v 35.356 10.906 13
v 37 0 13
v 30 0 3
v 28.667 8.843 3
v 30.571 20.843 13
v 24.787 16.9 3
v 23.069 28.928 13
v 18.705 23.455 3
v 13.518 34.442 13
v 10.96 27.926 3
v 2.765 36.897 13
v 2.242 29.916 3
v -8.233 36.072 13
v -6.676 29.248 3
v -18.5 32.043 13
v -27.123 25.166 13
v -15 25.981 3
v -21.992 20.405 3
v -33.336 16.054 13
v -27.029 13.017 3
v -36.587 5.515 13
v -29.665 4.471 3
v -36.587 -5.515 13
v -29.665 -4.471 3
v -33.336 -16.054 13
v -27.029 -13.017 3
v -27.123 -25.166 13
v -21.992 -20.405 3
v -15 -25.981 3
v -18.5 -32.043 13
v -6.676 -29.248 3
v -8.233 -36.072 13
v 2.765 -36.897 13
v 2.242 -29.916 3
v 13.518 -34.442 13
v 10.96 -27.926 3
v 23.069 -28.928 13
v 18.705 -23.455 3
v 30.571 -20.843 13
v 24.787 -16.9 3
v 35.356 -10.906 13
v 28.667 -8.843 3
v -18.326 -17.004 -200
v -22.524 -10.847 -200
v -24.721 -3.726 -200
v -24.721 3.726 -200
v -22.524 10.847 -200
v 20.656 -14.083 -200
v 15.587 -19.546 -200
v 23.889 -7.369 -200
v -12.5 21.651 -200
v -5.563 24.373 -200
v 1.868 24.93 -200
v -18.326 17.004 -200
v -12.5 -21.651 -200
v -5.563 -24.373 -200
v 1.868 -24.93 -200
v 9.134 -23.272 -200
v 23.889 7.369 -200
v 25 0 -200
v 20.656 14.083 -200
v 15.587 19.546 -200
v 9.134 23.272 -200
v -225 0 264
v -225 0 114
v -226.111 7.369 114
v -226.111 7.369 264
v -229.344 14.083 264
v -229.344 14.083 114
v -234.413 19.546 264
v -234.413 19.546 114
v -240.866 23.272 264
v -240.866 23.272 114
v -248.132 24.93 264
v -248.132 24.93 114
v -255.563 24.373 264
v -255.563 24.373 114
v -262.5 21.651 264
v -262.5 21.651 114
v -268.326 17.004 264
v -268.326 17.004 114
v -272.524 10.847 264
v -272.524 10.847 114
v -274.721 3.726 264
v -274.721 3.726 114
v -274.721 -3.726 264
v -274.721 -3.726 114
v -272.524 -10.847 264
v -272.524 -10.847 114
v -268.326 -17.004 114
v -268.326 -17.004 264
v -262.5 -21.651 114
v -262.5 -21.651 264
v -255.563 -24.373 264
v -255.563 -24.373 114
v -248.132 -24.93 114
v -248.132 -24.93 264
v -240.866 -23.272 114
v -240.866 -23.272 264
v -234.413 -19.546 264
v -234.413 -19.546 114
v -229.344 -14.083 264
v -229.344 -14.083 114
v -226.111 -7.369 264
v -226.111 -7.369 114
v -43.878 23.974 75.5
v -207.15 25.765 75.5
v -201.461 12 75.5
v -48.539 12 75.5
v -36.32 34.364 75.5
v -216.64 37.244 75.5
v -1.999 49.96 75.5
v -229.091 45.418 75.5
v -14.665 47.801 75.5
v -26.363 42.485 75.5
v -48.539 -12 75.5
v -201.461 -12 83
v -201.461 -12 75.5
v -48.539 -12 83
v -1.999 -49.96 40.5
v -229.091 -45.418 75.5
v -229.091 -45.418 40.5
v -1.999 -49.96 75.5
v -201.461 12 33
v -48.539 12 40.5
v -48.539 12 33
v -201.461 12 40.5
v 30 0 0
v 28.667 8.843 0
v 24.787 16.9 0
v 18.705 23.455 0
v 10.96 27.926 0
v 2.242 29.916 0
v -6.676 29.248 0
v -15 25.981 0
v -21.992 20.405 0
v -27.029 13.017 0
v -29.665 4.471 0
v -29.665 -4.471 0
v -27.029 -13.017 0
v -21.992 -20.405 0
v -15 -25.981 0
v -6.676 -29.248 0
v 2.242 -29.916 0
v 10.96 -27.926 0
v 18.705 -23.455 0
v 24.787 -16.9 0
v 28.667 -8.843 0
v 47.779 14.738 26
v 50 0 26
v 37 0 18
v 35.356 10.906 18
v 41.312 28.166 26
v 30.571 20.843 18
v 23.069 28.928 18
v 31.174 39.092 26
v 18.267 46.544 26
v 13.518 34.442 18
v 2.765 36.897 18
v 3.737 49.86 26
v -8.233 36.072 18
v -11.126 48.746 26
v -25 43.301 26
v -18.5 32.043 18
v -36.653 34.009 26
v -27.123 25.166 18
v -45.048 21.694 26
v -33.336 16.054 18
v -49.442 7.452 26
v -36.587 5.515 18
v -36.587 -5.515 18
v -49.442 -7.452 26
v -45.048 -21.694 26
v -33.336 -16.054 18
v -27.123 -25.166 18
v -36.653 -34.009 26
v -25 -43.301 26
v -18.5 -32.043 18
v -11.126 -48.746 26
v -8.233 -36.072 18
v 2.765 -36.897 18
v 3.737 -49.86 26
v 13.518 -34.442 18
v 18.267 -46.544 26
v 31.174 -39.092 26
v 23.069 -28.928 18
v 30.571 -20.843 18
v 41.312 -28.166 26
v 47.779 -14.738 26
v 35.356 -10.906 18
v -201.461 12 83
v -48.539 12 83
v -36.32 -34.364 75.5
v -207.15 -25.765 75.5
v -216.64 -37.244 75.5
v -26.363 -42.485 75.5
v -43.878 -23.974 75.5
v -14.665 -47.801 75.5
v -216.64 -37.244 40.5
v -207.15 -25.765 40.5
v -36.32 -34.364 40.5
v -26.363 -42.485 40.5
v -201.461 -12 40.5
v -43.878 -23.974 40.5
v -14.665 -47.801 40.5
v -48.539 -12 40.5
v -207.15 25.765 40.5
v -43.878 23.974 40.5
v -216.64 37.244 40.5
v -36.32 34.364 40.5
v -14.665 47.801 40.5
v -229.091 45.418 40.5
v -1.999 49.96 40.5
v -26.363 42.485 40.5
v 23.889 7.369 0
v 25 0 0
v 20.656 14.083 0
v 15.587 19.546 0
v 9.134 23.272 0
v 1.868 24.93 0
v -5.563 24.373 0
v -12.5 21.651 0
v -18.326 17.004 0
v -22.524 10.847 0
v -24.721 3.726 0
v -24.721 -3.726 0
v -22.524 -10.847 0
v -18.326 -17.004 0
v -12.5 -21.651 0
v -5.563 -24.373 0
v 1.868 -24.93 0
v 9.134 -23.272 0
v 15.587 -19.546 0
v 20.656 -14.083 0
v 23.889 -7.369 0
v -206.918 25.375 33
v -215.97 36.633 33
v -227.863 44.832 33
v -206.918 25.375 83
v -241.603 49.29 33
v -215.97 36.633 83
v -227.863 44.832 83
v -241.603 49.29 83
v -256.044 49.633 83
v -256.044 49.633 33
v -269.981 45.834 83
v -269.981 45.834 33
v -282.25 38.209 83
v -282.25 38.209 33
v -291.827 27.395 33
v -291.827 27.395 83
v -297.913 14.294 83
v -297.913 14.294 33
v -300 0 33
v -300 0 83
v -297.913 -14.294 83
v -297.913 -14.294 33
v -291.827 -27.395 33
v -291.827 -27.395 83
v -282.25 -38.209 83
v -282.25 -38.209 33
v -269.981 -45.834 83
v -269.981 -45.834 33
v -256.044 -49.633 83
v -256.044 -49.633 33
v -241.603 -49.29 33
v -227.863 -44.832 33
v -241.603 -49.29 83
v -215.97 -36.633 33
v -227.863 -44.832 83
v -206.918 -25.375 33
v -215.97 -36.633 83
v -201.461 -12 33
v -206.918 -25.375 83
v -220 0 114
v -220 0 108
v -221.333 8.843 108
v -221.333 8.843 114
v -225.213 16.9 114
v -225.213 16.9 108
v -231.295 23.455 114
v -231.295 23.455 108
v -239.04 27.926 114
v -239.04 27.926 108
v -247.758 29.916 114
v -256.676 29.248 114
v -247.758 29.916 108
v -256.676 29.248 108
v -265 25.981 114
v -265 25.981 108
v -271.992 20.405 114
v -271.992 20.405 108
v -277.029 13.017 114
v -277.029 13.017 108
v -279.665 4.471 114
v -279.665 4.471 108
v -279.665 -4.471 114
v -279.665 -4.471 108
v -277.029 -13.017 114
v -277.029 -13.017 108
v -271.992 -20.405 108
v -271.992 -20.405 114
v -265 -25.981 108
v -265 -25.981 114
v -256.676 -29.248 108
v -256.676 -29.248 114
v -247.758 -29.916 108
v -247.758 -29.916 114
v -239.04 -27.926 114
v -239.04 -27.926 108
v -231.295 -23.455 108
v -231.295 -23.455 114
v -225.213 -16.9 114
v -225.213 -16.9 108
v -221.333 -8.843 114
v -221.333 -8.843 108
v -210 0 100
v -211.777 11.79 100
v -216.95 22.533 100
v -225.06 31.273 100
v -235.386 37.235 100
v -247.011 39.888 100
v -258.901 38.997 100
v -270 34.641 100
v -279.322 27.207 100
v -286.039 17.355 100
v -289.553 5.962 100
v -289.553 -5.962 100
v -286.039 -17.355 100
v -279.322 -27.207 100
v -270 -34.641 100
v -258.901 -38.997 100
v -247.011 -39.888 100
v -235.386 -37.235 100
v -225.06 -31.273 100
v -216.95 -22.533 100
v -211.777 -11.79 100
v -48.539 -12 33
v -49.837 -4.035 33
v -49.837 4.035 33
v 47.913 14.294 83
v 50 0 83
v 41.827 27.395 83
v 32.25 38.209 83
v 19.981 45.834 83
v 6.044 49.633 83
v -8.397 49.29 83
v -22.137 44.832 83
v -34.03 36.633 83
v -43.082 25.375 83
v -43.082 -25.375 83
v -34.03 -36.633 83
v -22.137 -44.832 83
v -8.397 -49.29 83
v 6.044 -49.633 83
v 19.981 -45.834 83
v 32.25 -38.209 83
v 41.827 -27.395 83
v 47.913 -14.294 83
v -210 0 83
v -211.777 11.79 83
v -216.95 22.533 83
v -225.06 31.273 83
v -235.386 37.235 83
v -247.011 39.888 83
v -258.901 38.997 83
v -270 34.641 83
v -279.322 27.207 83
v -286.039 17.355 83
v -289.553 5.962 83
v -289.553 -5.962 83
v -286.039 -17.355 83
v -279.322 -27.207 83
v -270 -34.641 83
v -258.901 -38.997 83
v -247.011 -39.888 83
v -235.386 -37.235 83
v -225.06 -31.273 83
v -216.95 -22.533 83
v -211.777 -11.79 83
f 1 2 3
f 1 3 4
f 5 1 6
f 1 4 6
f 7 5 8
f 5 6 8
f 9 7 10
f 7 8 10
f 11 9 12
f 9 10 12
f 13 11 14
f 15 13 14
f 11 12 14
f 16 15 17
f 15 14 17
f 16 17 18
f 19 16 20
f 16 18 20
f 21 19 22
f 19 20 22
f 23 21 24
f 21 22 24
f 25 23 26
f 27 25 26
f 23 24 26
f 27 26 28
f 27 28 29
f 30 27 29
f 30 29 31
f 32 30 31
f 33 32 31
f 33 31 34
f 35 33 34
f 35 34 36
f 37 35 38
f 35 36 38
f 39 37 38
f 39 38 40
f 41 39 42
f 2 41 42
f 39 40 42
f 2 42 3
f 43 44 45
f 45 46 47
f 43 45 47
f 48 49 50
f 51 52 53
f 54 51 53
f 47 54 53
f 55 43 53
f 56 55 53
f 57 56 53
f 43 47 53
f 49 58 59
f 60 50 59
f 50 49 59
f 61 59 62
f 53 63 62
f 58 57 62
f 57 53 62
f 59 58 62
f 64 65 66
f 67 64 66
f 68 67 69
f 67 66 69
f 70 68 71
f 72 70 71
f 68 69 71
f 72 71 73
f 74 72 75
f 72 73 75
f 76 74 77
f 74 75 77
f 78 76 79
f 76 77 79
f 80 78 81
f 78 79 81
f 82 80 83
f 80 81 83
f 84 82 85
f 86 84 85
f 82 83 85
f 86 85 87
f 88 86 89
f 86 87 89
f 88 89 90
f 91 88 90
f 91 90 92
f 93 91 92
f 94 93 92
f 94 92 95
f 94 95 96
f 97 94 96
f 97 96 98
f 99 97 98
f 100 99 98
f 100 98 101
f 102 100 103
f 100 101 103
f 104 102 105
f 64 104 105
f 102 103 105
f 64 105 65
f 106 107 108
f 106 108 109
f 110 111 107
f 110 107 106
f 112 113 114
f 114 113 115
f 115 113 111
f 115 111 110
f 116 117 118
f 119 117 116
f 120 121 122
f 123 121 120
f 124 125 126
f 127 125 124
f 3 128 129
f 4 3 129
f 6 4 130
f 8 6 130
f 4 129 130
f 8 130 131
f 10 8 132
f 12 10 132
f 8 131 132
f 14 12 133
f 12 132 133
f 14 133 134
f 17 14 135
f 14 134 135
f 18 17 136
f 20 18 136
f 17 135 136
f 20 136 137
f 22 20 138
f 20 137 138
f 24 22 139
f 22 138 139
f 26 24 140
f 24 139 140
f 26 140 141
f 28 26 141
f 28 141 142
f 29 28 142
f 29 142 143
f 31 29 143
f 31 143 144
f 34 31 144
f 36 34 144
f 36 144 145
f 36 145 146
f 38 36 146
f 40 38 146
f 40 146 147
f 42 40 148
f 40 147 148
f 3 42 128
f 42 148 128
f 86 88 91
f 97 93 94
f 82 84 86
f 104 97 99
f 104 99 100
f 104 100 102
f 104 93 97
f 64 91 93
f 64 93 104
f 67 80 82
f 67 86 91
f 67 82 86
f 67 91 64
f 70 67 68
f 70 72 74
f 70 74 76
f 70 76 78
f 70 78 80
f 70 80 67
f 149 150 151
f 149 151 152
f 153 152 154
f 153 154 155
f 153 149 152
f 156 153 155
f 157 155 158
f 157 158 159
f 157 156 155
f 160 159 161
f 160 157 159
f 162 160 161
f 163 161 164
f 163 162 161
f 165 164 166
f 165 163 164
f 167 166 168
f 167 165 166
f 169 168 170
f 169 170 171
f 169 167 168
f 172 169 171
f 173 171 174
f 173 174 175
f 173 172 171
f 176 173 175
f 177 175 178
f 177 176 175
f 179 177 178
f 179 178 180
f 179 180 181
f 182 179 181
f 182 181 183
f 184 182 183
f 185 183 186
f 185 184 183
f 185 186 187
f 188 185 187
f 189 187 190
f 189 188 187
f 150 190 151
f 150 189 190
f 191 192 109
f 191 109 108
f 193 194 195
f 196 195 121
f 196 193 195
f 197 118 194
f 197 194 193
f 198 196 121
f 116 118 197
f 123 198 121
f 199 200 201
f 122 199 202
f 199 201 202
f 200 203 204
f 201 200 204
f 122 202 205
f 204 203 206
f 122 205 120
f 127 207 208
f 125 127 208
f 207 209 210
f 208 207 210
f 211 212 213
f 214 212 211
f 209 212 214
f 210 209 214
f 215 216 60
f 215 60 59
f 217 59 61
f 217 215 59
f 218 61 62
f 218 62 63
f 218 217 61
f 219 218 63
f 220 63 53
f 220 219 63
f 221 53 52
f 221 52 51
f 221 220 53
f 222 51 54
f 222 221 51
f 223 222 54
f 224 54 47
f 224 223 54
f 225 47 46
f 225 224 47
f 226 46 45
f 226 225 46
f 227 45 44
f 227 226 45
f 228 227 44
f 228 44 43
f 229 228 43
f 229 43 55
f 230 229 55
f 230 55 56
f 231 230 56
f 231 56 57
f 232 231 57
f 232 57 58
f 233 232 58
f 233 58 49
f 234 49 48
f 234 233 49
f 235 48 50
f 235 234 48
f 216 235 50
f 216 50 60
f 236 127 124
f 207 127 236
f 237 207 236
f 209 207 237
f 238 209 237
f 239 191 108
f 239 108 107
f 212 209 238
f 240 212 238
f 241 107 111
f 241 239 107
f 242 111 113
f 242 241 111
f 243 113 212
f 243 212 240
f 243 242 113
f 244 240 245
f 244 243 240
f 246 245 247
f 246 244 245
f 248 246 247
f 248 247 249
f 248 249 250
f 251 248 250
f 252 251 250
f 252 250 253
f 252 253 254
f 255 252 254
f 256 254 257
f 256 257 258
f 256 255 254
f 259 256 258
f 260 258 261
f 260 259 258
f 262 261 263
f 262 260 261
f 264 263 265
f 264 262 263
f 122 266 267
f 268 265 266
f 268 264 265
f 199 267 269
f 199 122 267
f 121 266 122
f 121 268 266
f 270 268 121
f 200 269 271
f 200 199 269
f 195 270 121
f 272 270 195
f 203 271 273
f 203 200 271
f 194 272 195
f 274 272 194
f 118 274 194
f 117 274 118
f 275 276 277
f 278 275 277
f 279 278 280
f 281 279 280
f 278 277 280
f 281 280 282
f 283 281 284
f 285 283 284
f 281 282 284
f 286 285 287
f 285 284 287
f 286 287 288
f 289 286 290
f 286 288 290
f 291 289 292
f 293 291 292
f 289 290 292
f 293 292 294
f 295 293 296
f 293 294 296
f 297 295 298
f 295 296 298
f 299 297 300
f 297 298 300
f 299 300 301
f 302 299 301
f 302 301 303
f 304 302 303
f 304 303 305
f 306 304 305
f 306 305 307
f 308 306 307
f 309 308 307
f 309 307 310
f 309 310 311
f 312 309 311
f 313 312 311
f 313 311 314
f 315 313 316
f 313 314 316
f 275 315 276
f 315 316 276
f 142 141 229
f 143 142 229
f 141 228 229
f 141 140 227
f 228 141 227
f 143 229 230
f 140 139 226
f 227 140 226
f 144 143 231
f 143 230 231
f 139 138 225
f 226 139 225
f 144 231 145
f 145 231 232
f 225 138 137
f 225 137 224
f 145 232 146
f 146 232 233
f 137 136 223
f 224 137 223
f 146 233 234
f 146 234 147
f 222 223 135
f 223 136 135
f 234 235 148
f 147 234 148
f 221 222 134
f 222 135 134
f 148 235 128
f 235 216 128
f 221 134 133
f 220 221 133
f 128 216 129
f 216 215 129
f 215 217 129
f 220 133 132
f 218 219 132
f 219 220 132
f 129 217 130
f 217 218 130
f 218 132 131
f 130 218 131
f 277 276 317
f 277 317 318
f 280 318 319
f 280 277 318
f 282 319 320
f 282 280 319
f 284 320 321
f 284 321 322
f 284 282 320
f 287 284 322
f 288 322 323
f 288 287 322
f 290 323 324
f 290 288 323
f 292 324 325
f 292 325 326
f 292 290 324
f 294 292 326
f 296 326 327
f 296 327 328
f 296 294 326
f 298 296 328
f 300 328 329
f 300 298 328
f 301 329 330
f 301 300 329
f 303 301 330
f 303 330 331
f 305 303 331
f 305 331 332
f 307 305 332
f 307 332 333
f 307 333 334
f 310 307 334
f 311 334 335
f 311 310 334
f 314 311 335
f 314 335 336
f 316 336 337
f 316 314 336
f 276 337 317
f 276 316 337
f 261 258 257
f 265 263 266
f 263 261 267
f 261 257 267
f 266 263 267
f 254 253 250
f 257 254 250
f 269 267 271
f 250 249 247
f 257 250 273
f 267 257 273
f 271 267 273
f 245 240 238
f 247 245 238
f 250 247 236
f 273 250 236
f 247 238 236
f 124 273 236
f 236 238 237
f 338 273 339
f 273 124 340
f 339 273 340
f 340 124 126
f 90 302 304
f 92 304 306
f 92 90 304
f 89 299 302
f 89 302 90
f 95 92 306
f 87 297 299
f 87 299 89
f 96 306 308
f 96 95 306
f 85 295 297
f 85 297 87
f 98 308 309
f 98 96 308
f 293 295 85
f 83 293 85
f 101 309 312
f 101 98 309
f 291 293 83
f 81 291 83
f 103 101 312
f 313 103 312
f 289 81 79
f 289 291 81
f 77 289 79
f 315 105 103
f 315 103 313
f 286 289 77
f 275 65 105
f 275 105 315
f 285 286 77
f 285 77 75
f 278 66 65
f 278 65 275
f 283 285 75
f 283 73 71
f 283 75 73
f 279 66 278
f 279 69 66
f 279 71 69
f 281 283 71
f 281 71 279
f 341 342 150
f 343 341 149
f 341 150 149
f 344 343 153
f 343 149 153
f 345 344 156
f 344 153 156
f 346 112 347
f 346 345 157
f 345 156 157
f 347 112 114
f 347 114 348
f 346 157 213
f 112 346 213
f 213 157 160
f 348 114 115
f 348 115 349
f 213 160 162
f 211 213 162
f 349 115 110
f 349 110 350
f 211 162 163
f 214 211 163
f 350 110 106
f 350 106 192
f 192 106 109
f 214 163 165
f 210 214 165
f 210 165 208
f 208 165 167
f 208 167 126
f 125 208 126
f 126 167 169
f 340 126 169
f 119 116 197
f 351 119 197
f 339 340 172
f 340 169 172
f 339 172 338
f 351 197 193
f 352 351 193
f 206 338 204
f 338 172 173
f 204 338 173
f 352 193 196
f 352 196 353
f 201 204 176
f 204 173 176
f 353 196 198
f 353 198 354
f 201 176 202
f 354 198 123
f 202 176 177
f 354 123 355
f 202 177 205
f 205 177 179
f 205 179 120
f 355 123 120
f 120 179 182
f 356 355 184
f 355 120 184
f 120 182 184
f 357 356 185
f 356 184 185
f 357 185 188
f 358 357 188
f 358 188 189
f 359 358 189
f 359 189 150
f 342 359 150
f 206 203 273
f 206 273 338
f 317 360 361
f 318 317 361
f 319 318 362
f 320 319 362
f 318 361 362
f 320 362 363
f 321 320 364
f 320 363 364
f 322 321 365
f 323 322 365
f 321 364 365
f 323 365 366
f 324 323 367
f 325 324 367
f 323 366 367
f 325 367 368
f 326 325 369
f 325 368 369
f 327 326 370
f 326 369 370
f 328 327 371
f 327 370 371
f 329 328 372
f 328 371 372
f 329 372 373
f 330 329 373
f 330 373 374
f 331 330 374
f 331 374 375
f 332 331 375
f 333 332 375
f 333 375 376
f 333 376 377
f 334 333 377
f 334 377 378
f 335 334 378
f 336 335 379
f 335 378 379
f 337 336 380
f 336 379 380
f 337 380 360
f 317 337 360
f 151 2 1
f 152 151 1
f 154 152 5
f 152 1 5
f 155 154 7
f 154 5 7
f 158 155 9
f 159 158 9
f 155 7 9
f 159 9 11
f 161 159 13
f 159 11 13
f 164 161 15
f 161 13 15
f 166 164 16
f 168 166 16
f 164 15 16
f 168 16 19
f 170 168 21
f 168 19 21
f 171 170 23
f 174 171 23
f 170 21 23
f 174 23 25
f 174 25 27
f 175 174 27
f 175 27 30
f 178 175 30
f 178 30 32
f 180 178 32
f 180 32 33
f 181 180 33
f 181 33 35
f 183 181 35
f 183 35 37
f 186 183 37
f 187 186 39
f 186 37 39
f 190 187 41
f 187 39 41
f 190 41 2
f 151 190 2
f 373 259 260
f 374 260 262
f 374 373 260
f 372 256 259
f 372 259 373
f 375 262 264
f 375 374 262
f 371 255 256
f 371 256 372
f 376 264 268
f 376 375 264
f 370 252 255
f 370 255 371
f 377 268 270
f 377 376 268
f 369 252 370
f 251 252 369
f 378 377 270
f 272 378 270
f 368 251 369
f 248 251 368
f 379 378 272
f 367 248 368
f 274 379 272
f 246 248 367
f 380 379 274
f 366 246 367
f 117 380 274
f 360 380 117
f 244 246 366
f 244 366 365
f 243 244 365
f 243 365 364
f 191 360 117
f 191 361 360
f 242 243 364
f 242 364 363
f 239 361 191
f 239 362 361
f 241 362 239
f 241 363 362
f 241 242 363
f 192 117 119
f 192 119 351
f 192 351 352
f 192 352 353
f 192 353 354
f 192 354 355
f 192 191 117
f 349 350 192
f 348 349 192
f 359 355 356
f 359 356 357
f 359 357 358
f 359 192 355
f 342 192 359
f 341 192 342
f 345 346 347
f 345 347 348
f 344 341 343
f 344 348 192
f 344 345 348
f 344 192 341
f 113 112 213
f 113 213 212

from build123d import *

# Parameters (mm, degrees)
SKETCH_1_R      = 25
EXTRUDE_1_DEPTH = 200
SKETCH_2_R      = 30
EXTRUDE_2_DEPTH = 3
SKETCH_3_R      = 37
EXTRUDE_3_DEPTH = 15
SKETCH_4_R      = 50
EXTRUDE_4_DEPTH = 65
CHAMFER_1_SIZE2 = 7
CHAMFER_1_SIZE  = 10
CHAMFER_2_SIZE2 = 8
CHAMFER_2_SIZE  = 13
EXTRUDE_5_DEPTH = 17.5
EXTRUDE_6_DEPTH = 25
SKETCH_7_R      = 40
EXTRUDE_7_DEPTH = 25
SKETCH_8_R      = 30
EXTRUDE_8_DEPTH = 6
CHAMFER_3_SIZE2 = 10
CHAMFER_3_SIZE  = 8
SKETCH_9_R      = 25
EXTRUDE_9_DEPTH = 150


with BuildPart() as part:
    # 草图1 → 凸台-拉伸1 (new body)
    with BuildSketch(Plane.XY):
        Circle(SKETCH_1_R)
    extrude(amount=-EXTRUDE_1_DEPTH)

    # 草图2 → 凸台-拉伸2 (add)
    with BuildSketch(Plane.XY):
        Circle(SKETCH_2_R)
    extrude(amount=EXTRUDE_2_DEPTH)

    # 草图3 → 凸台-拉伸3 (add)
    with BuildSketch(Plane.XY.offset(3)):
        Circle(SKETCH_3_R)
    extrude(amount=EXTRUDE_3_DEPTH)

    # 草图4 → 凸台-拉伸4 (add)
    with BuildSketch(Plane.XY.offset(18)):
        Circle(SKETCH_4_R)
    extrude(amount=EXTRUDE_4_DEPTH)

    # 倒角1
    chamfer_1_edges = [part.edges().sort_by_distance(p)[0] for p in [
        (-37, 0, 3),
    ]]
    chamfer_1_side = [part.faces().sort_by_distance(p)[0] for p in [
        (-37, 0, 3.14),
    ]]
    chamfer(chamfer_1_edges, length=CHAMFER_1_SIZE - 0.0001, length2=CHAMFER_1_SIZE2 - 0.0001, reference=chamfer_1_side[0])  # a hair under: the kernel refuses the full size

    # 倒角2
    chamfer_2_edges = [part.edges().sort_by_distance(p)[0] for p in [
        (-50, 0, 18),
    ]]
    chamfer_2_side = [part.faces().sort_by_distance(p)[0] for p in [
        (-49.84, 0, 18),
    ]]
    chamfer(chamfer_2_edges, length=CHAMFER_2_SIZE - 0.0001, length2=CHAMFER_2_SIZE2 - 0.0001, reference=chamfer_2_side[0])  # a hair under: the kernel refuses the full size

    # 草图5 → 凸台-拉伸5 (add, symmetric)
    with BuildSketch(Plane.XY.offset(58)):
        with BuildLine():
            Line((-1.99920032, 49.960015994), (-250, 45))
            ThreePointArc((-250, 45), (-295, 0), (-250, -45))
            Line((-250, -45), (-1.99920032, -49.960015994))
            ThreePointArc((-1.99920032, -49.960015994), (-50, 0), (-1.99920032, 49.960015994))
        make_face()
    extrude(amount=EXTRUDE_5_DEPTH, both=True)

    # 草图6 → 凸台-拉伸6 (add, symmetric)
    with BuildSketch(Plane.XY.offset(58)):
        with BuildLine():
            Line((-201.461355602, -12), (0, -12))
            Line((0, -12), (0, 12))
            Line((0, 12), (-201.461355602, 12))
            ThreePointArc((-201.461355602, 12), (-300, 0), (-201.461355602, -12))
        make_face()
    extrude(amount=EXTRUDE_6_DEPTH, both=True)

    # 草图7 → 凸台-拉伸7 (add)
    with BuildSketch(Plane.XY.offset(83)):
        with Locations((-250, 0)):
            Circle(SKETCH_7_R)
    extrude(amount=EXTRUDE_7_DEPTH)

    # 草图8 → 凸台-拉伸8 (add)
    with BuildSketch(Plane.XY.offset(108)):
        with Locations((-250, 0)):
            Circle(SKETCH_8_R)
    extrude(amount=EXTRUDE_8_DEPTH)

    # 倒角3
    chamfer_3_edges = [part.edges().sort_by_distance(p)[0] for p in [
        (-290, 0, 108),
    ]]
    chamfer_3_side = [part.faces().sort_by_distance(p)[0] for p in [
        (-290, 0, 107.84),
    ]]
    chamfer(chamfer_3_edges, length=CHAMFER_3_SIZE - 0.0001, length2=CHAMFER_3_SIZE2 - 0.0001, reference=chamfer_3_side[0])  # a hair under: the kernel refuses the full size

    # 草图9 → 凸台-拉伸9 (add)
    with BuildSketch(Plane.XY.offset(114)):
        with Locations((-250, 0)):
            Circle(SKETCH_9_R)
    extrude(amount=EXTRUDE_9_DEPTH)


solid = part.part
